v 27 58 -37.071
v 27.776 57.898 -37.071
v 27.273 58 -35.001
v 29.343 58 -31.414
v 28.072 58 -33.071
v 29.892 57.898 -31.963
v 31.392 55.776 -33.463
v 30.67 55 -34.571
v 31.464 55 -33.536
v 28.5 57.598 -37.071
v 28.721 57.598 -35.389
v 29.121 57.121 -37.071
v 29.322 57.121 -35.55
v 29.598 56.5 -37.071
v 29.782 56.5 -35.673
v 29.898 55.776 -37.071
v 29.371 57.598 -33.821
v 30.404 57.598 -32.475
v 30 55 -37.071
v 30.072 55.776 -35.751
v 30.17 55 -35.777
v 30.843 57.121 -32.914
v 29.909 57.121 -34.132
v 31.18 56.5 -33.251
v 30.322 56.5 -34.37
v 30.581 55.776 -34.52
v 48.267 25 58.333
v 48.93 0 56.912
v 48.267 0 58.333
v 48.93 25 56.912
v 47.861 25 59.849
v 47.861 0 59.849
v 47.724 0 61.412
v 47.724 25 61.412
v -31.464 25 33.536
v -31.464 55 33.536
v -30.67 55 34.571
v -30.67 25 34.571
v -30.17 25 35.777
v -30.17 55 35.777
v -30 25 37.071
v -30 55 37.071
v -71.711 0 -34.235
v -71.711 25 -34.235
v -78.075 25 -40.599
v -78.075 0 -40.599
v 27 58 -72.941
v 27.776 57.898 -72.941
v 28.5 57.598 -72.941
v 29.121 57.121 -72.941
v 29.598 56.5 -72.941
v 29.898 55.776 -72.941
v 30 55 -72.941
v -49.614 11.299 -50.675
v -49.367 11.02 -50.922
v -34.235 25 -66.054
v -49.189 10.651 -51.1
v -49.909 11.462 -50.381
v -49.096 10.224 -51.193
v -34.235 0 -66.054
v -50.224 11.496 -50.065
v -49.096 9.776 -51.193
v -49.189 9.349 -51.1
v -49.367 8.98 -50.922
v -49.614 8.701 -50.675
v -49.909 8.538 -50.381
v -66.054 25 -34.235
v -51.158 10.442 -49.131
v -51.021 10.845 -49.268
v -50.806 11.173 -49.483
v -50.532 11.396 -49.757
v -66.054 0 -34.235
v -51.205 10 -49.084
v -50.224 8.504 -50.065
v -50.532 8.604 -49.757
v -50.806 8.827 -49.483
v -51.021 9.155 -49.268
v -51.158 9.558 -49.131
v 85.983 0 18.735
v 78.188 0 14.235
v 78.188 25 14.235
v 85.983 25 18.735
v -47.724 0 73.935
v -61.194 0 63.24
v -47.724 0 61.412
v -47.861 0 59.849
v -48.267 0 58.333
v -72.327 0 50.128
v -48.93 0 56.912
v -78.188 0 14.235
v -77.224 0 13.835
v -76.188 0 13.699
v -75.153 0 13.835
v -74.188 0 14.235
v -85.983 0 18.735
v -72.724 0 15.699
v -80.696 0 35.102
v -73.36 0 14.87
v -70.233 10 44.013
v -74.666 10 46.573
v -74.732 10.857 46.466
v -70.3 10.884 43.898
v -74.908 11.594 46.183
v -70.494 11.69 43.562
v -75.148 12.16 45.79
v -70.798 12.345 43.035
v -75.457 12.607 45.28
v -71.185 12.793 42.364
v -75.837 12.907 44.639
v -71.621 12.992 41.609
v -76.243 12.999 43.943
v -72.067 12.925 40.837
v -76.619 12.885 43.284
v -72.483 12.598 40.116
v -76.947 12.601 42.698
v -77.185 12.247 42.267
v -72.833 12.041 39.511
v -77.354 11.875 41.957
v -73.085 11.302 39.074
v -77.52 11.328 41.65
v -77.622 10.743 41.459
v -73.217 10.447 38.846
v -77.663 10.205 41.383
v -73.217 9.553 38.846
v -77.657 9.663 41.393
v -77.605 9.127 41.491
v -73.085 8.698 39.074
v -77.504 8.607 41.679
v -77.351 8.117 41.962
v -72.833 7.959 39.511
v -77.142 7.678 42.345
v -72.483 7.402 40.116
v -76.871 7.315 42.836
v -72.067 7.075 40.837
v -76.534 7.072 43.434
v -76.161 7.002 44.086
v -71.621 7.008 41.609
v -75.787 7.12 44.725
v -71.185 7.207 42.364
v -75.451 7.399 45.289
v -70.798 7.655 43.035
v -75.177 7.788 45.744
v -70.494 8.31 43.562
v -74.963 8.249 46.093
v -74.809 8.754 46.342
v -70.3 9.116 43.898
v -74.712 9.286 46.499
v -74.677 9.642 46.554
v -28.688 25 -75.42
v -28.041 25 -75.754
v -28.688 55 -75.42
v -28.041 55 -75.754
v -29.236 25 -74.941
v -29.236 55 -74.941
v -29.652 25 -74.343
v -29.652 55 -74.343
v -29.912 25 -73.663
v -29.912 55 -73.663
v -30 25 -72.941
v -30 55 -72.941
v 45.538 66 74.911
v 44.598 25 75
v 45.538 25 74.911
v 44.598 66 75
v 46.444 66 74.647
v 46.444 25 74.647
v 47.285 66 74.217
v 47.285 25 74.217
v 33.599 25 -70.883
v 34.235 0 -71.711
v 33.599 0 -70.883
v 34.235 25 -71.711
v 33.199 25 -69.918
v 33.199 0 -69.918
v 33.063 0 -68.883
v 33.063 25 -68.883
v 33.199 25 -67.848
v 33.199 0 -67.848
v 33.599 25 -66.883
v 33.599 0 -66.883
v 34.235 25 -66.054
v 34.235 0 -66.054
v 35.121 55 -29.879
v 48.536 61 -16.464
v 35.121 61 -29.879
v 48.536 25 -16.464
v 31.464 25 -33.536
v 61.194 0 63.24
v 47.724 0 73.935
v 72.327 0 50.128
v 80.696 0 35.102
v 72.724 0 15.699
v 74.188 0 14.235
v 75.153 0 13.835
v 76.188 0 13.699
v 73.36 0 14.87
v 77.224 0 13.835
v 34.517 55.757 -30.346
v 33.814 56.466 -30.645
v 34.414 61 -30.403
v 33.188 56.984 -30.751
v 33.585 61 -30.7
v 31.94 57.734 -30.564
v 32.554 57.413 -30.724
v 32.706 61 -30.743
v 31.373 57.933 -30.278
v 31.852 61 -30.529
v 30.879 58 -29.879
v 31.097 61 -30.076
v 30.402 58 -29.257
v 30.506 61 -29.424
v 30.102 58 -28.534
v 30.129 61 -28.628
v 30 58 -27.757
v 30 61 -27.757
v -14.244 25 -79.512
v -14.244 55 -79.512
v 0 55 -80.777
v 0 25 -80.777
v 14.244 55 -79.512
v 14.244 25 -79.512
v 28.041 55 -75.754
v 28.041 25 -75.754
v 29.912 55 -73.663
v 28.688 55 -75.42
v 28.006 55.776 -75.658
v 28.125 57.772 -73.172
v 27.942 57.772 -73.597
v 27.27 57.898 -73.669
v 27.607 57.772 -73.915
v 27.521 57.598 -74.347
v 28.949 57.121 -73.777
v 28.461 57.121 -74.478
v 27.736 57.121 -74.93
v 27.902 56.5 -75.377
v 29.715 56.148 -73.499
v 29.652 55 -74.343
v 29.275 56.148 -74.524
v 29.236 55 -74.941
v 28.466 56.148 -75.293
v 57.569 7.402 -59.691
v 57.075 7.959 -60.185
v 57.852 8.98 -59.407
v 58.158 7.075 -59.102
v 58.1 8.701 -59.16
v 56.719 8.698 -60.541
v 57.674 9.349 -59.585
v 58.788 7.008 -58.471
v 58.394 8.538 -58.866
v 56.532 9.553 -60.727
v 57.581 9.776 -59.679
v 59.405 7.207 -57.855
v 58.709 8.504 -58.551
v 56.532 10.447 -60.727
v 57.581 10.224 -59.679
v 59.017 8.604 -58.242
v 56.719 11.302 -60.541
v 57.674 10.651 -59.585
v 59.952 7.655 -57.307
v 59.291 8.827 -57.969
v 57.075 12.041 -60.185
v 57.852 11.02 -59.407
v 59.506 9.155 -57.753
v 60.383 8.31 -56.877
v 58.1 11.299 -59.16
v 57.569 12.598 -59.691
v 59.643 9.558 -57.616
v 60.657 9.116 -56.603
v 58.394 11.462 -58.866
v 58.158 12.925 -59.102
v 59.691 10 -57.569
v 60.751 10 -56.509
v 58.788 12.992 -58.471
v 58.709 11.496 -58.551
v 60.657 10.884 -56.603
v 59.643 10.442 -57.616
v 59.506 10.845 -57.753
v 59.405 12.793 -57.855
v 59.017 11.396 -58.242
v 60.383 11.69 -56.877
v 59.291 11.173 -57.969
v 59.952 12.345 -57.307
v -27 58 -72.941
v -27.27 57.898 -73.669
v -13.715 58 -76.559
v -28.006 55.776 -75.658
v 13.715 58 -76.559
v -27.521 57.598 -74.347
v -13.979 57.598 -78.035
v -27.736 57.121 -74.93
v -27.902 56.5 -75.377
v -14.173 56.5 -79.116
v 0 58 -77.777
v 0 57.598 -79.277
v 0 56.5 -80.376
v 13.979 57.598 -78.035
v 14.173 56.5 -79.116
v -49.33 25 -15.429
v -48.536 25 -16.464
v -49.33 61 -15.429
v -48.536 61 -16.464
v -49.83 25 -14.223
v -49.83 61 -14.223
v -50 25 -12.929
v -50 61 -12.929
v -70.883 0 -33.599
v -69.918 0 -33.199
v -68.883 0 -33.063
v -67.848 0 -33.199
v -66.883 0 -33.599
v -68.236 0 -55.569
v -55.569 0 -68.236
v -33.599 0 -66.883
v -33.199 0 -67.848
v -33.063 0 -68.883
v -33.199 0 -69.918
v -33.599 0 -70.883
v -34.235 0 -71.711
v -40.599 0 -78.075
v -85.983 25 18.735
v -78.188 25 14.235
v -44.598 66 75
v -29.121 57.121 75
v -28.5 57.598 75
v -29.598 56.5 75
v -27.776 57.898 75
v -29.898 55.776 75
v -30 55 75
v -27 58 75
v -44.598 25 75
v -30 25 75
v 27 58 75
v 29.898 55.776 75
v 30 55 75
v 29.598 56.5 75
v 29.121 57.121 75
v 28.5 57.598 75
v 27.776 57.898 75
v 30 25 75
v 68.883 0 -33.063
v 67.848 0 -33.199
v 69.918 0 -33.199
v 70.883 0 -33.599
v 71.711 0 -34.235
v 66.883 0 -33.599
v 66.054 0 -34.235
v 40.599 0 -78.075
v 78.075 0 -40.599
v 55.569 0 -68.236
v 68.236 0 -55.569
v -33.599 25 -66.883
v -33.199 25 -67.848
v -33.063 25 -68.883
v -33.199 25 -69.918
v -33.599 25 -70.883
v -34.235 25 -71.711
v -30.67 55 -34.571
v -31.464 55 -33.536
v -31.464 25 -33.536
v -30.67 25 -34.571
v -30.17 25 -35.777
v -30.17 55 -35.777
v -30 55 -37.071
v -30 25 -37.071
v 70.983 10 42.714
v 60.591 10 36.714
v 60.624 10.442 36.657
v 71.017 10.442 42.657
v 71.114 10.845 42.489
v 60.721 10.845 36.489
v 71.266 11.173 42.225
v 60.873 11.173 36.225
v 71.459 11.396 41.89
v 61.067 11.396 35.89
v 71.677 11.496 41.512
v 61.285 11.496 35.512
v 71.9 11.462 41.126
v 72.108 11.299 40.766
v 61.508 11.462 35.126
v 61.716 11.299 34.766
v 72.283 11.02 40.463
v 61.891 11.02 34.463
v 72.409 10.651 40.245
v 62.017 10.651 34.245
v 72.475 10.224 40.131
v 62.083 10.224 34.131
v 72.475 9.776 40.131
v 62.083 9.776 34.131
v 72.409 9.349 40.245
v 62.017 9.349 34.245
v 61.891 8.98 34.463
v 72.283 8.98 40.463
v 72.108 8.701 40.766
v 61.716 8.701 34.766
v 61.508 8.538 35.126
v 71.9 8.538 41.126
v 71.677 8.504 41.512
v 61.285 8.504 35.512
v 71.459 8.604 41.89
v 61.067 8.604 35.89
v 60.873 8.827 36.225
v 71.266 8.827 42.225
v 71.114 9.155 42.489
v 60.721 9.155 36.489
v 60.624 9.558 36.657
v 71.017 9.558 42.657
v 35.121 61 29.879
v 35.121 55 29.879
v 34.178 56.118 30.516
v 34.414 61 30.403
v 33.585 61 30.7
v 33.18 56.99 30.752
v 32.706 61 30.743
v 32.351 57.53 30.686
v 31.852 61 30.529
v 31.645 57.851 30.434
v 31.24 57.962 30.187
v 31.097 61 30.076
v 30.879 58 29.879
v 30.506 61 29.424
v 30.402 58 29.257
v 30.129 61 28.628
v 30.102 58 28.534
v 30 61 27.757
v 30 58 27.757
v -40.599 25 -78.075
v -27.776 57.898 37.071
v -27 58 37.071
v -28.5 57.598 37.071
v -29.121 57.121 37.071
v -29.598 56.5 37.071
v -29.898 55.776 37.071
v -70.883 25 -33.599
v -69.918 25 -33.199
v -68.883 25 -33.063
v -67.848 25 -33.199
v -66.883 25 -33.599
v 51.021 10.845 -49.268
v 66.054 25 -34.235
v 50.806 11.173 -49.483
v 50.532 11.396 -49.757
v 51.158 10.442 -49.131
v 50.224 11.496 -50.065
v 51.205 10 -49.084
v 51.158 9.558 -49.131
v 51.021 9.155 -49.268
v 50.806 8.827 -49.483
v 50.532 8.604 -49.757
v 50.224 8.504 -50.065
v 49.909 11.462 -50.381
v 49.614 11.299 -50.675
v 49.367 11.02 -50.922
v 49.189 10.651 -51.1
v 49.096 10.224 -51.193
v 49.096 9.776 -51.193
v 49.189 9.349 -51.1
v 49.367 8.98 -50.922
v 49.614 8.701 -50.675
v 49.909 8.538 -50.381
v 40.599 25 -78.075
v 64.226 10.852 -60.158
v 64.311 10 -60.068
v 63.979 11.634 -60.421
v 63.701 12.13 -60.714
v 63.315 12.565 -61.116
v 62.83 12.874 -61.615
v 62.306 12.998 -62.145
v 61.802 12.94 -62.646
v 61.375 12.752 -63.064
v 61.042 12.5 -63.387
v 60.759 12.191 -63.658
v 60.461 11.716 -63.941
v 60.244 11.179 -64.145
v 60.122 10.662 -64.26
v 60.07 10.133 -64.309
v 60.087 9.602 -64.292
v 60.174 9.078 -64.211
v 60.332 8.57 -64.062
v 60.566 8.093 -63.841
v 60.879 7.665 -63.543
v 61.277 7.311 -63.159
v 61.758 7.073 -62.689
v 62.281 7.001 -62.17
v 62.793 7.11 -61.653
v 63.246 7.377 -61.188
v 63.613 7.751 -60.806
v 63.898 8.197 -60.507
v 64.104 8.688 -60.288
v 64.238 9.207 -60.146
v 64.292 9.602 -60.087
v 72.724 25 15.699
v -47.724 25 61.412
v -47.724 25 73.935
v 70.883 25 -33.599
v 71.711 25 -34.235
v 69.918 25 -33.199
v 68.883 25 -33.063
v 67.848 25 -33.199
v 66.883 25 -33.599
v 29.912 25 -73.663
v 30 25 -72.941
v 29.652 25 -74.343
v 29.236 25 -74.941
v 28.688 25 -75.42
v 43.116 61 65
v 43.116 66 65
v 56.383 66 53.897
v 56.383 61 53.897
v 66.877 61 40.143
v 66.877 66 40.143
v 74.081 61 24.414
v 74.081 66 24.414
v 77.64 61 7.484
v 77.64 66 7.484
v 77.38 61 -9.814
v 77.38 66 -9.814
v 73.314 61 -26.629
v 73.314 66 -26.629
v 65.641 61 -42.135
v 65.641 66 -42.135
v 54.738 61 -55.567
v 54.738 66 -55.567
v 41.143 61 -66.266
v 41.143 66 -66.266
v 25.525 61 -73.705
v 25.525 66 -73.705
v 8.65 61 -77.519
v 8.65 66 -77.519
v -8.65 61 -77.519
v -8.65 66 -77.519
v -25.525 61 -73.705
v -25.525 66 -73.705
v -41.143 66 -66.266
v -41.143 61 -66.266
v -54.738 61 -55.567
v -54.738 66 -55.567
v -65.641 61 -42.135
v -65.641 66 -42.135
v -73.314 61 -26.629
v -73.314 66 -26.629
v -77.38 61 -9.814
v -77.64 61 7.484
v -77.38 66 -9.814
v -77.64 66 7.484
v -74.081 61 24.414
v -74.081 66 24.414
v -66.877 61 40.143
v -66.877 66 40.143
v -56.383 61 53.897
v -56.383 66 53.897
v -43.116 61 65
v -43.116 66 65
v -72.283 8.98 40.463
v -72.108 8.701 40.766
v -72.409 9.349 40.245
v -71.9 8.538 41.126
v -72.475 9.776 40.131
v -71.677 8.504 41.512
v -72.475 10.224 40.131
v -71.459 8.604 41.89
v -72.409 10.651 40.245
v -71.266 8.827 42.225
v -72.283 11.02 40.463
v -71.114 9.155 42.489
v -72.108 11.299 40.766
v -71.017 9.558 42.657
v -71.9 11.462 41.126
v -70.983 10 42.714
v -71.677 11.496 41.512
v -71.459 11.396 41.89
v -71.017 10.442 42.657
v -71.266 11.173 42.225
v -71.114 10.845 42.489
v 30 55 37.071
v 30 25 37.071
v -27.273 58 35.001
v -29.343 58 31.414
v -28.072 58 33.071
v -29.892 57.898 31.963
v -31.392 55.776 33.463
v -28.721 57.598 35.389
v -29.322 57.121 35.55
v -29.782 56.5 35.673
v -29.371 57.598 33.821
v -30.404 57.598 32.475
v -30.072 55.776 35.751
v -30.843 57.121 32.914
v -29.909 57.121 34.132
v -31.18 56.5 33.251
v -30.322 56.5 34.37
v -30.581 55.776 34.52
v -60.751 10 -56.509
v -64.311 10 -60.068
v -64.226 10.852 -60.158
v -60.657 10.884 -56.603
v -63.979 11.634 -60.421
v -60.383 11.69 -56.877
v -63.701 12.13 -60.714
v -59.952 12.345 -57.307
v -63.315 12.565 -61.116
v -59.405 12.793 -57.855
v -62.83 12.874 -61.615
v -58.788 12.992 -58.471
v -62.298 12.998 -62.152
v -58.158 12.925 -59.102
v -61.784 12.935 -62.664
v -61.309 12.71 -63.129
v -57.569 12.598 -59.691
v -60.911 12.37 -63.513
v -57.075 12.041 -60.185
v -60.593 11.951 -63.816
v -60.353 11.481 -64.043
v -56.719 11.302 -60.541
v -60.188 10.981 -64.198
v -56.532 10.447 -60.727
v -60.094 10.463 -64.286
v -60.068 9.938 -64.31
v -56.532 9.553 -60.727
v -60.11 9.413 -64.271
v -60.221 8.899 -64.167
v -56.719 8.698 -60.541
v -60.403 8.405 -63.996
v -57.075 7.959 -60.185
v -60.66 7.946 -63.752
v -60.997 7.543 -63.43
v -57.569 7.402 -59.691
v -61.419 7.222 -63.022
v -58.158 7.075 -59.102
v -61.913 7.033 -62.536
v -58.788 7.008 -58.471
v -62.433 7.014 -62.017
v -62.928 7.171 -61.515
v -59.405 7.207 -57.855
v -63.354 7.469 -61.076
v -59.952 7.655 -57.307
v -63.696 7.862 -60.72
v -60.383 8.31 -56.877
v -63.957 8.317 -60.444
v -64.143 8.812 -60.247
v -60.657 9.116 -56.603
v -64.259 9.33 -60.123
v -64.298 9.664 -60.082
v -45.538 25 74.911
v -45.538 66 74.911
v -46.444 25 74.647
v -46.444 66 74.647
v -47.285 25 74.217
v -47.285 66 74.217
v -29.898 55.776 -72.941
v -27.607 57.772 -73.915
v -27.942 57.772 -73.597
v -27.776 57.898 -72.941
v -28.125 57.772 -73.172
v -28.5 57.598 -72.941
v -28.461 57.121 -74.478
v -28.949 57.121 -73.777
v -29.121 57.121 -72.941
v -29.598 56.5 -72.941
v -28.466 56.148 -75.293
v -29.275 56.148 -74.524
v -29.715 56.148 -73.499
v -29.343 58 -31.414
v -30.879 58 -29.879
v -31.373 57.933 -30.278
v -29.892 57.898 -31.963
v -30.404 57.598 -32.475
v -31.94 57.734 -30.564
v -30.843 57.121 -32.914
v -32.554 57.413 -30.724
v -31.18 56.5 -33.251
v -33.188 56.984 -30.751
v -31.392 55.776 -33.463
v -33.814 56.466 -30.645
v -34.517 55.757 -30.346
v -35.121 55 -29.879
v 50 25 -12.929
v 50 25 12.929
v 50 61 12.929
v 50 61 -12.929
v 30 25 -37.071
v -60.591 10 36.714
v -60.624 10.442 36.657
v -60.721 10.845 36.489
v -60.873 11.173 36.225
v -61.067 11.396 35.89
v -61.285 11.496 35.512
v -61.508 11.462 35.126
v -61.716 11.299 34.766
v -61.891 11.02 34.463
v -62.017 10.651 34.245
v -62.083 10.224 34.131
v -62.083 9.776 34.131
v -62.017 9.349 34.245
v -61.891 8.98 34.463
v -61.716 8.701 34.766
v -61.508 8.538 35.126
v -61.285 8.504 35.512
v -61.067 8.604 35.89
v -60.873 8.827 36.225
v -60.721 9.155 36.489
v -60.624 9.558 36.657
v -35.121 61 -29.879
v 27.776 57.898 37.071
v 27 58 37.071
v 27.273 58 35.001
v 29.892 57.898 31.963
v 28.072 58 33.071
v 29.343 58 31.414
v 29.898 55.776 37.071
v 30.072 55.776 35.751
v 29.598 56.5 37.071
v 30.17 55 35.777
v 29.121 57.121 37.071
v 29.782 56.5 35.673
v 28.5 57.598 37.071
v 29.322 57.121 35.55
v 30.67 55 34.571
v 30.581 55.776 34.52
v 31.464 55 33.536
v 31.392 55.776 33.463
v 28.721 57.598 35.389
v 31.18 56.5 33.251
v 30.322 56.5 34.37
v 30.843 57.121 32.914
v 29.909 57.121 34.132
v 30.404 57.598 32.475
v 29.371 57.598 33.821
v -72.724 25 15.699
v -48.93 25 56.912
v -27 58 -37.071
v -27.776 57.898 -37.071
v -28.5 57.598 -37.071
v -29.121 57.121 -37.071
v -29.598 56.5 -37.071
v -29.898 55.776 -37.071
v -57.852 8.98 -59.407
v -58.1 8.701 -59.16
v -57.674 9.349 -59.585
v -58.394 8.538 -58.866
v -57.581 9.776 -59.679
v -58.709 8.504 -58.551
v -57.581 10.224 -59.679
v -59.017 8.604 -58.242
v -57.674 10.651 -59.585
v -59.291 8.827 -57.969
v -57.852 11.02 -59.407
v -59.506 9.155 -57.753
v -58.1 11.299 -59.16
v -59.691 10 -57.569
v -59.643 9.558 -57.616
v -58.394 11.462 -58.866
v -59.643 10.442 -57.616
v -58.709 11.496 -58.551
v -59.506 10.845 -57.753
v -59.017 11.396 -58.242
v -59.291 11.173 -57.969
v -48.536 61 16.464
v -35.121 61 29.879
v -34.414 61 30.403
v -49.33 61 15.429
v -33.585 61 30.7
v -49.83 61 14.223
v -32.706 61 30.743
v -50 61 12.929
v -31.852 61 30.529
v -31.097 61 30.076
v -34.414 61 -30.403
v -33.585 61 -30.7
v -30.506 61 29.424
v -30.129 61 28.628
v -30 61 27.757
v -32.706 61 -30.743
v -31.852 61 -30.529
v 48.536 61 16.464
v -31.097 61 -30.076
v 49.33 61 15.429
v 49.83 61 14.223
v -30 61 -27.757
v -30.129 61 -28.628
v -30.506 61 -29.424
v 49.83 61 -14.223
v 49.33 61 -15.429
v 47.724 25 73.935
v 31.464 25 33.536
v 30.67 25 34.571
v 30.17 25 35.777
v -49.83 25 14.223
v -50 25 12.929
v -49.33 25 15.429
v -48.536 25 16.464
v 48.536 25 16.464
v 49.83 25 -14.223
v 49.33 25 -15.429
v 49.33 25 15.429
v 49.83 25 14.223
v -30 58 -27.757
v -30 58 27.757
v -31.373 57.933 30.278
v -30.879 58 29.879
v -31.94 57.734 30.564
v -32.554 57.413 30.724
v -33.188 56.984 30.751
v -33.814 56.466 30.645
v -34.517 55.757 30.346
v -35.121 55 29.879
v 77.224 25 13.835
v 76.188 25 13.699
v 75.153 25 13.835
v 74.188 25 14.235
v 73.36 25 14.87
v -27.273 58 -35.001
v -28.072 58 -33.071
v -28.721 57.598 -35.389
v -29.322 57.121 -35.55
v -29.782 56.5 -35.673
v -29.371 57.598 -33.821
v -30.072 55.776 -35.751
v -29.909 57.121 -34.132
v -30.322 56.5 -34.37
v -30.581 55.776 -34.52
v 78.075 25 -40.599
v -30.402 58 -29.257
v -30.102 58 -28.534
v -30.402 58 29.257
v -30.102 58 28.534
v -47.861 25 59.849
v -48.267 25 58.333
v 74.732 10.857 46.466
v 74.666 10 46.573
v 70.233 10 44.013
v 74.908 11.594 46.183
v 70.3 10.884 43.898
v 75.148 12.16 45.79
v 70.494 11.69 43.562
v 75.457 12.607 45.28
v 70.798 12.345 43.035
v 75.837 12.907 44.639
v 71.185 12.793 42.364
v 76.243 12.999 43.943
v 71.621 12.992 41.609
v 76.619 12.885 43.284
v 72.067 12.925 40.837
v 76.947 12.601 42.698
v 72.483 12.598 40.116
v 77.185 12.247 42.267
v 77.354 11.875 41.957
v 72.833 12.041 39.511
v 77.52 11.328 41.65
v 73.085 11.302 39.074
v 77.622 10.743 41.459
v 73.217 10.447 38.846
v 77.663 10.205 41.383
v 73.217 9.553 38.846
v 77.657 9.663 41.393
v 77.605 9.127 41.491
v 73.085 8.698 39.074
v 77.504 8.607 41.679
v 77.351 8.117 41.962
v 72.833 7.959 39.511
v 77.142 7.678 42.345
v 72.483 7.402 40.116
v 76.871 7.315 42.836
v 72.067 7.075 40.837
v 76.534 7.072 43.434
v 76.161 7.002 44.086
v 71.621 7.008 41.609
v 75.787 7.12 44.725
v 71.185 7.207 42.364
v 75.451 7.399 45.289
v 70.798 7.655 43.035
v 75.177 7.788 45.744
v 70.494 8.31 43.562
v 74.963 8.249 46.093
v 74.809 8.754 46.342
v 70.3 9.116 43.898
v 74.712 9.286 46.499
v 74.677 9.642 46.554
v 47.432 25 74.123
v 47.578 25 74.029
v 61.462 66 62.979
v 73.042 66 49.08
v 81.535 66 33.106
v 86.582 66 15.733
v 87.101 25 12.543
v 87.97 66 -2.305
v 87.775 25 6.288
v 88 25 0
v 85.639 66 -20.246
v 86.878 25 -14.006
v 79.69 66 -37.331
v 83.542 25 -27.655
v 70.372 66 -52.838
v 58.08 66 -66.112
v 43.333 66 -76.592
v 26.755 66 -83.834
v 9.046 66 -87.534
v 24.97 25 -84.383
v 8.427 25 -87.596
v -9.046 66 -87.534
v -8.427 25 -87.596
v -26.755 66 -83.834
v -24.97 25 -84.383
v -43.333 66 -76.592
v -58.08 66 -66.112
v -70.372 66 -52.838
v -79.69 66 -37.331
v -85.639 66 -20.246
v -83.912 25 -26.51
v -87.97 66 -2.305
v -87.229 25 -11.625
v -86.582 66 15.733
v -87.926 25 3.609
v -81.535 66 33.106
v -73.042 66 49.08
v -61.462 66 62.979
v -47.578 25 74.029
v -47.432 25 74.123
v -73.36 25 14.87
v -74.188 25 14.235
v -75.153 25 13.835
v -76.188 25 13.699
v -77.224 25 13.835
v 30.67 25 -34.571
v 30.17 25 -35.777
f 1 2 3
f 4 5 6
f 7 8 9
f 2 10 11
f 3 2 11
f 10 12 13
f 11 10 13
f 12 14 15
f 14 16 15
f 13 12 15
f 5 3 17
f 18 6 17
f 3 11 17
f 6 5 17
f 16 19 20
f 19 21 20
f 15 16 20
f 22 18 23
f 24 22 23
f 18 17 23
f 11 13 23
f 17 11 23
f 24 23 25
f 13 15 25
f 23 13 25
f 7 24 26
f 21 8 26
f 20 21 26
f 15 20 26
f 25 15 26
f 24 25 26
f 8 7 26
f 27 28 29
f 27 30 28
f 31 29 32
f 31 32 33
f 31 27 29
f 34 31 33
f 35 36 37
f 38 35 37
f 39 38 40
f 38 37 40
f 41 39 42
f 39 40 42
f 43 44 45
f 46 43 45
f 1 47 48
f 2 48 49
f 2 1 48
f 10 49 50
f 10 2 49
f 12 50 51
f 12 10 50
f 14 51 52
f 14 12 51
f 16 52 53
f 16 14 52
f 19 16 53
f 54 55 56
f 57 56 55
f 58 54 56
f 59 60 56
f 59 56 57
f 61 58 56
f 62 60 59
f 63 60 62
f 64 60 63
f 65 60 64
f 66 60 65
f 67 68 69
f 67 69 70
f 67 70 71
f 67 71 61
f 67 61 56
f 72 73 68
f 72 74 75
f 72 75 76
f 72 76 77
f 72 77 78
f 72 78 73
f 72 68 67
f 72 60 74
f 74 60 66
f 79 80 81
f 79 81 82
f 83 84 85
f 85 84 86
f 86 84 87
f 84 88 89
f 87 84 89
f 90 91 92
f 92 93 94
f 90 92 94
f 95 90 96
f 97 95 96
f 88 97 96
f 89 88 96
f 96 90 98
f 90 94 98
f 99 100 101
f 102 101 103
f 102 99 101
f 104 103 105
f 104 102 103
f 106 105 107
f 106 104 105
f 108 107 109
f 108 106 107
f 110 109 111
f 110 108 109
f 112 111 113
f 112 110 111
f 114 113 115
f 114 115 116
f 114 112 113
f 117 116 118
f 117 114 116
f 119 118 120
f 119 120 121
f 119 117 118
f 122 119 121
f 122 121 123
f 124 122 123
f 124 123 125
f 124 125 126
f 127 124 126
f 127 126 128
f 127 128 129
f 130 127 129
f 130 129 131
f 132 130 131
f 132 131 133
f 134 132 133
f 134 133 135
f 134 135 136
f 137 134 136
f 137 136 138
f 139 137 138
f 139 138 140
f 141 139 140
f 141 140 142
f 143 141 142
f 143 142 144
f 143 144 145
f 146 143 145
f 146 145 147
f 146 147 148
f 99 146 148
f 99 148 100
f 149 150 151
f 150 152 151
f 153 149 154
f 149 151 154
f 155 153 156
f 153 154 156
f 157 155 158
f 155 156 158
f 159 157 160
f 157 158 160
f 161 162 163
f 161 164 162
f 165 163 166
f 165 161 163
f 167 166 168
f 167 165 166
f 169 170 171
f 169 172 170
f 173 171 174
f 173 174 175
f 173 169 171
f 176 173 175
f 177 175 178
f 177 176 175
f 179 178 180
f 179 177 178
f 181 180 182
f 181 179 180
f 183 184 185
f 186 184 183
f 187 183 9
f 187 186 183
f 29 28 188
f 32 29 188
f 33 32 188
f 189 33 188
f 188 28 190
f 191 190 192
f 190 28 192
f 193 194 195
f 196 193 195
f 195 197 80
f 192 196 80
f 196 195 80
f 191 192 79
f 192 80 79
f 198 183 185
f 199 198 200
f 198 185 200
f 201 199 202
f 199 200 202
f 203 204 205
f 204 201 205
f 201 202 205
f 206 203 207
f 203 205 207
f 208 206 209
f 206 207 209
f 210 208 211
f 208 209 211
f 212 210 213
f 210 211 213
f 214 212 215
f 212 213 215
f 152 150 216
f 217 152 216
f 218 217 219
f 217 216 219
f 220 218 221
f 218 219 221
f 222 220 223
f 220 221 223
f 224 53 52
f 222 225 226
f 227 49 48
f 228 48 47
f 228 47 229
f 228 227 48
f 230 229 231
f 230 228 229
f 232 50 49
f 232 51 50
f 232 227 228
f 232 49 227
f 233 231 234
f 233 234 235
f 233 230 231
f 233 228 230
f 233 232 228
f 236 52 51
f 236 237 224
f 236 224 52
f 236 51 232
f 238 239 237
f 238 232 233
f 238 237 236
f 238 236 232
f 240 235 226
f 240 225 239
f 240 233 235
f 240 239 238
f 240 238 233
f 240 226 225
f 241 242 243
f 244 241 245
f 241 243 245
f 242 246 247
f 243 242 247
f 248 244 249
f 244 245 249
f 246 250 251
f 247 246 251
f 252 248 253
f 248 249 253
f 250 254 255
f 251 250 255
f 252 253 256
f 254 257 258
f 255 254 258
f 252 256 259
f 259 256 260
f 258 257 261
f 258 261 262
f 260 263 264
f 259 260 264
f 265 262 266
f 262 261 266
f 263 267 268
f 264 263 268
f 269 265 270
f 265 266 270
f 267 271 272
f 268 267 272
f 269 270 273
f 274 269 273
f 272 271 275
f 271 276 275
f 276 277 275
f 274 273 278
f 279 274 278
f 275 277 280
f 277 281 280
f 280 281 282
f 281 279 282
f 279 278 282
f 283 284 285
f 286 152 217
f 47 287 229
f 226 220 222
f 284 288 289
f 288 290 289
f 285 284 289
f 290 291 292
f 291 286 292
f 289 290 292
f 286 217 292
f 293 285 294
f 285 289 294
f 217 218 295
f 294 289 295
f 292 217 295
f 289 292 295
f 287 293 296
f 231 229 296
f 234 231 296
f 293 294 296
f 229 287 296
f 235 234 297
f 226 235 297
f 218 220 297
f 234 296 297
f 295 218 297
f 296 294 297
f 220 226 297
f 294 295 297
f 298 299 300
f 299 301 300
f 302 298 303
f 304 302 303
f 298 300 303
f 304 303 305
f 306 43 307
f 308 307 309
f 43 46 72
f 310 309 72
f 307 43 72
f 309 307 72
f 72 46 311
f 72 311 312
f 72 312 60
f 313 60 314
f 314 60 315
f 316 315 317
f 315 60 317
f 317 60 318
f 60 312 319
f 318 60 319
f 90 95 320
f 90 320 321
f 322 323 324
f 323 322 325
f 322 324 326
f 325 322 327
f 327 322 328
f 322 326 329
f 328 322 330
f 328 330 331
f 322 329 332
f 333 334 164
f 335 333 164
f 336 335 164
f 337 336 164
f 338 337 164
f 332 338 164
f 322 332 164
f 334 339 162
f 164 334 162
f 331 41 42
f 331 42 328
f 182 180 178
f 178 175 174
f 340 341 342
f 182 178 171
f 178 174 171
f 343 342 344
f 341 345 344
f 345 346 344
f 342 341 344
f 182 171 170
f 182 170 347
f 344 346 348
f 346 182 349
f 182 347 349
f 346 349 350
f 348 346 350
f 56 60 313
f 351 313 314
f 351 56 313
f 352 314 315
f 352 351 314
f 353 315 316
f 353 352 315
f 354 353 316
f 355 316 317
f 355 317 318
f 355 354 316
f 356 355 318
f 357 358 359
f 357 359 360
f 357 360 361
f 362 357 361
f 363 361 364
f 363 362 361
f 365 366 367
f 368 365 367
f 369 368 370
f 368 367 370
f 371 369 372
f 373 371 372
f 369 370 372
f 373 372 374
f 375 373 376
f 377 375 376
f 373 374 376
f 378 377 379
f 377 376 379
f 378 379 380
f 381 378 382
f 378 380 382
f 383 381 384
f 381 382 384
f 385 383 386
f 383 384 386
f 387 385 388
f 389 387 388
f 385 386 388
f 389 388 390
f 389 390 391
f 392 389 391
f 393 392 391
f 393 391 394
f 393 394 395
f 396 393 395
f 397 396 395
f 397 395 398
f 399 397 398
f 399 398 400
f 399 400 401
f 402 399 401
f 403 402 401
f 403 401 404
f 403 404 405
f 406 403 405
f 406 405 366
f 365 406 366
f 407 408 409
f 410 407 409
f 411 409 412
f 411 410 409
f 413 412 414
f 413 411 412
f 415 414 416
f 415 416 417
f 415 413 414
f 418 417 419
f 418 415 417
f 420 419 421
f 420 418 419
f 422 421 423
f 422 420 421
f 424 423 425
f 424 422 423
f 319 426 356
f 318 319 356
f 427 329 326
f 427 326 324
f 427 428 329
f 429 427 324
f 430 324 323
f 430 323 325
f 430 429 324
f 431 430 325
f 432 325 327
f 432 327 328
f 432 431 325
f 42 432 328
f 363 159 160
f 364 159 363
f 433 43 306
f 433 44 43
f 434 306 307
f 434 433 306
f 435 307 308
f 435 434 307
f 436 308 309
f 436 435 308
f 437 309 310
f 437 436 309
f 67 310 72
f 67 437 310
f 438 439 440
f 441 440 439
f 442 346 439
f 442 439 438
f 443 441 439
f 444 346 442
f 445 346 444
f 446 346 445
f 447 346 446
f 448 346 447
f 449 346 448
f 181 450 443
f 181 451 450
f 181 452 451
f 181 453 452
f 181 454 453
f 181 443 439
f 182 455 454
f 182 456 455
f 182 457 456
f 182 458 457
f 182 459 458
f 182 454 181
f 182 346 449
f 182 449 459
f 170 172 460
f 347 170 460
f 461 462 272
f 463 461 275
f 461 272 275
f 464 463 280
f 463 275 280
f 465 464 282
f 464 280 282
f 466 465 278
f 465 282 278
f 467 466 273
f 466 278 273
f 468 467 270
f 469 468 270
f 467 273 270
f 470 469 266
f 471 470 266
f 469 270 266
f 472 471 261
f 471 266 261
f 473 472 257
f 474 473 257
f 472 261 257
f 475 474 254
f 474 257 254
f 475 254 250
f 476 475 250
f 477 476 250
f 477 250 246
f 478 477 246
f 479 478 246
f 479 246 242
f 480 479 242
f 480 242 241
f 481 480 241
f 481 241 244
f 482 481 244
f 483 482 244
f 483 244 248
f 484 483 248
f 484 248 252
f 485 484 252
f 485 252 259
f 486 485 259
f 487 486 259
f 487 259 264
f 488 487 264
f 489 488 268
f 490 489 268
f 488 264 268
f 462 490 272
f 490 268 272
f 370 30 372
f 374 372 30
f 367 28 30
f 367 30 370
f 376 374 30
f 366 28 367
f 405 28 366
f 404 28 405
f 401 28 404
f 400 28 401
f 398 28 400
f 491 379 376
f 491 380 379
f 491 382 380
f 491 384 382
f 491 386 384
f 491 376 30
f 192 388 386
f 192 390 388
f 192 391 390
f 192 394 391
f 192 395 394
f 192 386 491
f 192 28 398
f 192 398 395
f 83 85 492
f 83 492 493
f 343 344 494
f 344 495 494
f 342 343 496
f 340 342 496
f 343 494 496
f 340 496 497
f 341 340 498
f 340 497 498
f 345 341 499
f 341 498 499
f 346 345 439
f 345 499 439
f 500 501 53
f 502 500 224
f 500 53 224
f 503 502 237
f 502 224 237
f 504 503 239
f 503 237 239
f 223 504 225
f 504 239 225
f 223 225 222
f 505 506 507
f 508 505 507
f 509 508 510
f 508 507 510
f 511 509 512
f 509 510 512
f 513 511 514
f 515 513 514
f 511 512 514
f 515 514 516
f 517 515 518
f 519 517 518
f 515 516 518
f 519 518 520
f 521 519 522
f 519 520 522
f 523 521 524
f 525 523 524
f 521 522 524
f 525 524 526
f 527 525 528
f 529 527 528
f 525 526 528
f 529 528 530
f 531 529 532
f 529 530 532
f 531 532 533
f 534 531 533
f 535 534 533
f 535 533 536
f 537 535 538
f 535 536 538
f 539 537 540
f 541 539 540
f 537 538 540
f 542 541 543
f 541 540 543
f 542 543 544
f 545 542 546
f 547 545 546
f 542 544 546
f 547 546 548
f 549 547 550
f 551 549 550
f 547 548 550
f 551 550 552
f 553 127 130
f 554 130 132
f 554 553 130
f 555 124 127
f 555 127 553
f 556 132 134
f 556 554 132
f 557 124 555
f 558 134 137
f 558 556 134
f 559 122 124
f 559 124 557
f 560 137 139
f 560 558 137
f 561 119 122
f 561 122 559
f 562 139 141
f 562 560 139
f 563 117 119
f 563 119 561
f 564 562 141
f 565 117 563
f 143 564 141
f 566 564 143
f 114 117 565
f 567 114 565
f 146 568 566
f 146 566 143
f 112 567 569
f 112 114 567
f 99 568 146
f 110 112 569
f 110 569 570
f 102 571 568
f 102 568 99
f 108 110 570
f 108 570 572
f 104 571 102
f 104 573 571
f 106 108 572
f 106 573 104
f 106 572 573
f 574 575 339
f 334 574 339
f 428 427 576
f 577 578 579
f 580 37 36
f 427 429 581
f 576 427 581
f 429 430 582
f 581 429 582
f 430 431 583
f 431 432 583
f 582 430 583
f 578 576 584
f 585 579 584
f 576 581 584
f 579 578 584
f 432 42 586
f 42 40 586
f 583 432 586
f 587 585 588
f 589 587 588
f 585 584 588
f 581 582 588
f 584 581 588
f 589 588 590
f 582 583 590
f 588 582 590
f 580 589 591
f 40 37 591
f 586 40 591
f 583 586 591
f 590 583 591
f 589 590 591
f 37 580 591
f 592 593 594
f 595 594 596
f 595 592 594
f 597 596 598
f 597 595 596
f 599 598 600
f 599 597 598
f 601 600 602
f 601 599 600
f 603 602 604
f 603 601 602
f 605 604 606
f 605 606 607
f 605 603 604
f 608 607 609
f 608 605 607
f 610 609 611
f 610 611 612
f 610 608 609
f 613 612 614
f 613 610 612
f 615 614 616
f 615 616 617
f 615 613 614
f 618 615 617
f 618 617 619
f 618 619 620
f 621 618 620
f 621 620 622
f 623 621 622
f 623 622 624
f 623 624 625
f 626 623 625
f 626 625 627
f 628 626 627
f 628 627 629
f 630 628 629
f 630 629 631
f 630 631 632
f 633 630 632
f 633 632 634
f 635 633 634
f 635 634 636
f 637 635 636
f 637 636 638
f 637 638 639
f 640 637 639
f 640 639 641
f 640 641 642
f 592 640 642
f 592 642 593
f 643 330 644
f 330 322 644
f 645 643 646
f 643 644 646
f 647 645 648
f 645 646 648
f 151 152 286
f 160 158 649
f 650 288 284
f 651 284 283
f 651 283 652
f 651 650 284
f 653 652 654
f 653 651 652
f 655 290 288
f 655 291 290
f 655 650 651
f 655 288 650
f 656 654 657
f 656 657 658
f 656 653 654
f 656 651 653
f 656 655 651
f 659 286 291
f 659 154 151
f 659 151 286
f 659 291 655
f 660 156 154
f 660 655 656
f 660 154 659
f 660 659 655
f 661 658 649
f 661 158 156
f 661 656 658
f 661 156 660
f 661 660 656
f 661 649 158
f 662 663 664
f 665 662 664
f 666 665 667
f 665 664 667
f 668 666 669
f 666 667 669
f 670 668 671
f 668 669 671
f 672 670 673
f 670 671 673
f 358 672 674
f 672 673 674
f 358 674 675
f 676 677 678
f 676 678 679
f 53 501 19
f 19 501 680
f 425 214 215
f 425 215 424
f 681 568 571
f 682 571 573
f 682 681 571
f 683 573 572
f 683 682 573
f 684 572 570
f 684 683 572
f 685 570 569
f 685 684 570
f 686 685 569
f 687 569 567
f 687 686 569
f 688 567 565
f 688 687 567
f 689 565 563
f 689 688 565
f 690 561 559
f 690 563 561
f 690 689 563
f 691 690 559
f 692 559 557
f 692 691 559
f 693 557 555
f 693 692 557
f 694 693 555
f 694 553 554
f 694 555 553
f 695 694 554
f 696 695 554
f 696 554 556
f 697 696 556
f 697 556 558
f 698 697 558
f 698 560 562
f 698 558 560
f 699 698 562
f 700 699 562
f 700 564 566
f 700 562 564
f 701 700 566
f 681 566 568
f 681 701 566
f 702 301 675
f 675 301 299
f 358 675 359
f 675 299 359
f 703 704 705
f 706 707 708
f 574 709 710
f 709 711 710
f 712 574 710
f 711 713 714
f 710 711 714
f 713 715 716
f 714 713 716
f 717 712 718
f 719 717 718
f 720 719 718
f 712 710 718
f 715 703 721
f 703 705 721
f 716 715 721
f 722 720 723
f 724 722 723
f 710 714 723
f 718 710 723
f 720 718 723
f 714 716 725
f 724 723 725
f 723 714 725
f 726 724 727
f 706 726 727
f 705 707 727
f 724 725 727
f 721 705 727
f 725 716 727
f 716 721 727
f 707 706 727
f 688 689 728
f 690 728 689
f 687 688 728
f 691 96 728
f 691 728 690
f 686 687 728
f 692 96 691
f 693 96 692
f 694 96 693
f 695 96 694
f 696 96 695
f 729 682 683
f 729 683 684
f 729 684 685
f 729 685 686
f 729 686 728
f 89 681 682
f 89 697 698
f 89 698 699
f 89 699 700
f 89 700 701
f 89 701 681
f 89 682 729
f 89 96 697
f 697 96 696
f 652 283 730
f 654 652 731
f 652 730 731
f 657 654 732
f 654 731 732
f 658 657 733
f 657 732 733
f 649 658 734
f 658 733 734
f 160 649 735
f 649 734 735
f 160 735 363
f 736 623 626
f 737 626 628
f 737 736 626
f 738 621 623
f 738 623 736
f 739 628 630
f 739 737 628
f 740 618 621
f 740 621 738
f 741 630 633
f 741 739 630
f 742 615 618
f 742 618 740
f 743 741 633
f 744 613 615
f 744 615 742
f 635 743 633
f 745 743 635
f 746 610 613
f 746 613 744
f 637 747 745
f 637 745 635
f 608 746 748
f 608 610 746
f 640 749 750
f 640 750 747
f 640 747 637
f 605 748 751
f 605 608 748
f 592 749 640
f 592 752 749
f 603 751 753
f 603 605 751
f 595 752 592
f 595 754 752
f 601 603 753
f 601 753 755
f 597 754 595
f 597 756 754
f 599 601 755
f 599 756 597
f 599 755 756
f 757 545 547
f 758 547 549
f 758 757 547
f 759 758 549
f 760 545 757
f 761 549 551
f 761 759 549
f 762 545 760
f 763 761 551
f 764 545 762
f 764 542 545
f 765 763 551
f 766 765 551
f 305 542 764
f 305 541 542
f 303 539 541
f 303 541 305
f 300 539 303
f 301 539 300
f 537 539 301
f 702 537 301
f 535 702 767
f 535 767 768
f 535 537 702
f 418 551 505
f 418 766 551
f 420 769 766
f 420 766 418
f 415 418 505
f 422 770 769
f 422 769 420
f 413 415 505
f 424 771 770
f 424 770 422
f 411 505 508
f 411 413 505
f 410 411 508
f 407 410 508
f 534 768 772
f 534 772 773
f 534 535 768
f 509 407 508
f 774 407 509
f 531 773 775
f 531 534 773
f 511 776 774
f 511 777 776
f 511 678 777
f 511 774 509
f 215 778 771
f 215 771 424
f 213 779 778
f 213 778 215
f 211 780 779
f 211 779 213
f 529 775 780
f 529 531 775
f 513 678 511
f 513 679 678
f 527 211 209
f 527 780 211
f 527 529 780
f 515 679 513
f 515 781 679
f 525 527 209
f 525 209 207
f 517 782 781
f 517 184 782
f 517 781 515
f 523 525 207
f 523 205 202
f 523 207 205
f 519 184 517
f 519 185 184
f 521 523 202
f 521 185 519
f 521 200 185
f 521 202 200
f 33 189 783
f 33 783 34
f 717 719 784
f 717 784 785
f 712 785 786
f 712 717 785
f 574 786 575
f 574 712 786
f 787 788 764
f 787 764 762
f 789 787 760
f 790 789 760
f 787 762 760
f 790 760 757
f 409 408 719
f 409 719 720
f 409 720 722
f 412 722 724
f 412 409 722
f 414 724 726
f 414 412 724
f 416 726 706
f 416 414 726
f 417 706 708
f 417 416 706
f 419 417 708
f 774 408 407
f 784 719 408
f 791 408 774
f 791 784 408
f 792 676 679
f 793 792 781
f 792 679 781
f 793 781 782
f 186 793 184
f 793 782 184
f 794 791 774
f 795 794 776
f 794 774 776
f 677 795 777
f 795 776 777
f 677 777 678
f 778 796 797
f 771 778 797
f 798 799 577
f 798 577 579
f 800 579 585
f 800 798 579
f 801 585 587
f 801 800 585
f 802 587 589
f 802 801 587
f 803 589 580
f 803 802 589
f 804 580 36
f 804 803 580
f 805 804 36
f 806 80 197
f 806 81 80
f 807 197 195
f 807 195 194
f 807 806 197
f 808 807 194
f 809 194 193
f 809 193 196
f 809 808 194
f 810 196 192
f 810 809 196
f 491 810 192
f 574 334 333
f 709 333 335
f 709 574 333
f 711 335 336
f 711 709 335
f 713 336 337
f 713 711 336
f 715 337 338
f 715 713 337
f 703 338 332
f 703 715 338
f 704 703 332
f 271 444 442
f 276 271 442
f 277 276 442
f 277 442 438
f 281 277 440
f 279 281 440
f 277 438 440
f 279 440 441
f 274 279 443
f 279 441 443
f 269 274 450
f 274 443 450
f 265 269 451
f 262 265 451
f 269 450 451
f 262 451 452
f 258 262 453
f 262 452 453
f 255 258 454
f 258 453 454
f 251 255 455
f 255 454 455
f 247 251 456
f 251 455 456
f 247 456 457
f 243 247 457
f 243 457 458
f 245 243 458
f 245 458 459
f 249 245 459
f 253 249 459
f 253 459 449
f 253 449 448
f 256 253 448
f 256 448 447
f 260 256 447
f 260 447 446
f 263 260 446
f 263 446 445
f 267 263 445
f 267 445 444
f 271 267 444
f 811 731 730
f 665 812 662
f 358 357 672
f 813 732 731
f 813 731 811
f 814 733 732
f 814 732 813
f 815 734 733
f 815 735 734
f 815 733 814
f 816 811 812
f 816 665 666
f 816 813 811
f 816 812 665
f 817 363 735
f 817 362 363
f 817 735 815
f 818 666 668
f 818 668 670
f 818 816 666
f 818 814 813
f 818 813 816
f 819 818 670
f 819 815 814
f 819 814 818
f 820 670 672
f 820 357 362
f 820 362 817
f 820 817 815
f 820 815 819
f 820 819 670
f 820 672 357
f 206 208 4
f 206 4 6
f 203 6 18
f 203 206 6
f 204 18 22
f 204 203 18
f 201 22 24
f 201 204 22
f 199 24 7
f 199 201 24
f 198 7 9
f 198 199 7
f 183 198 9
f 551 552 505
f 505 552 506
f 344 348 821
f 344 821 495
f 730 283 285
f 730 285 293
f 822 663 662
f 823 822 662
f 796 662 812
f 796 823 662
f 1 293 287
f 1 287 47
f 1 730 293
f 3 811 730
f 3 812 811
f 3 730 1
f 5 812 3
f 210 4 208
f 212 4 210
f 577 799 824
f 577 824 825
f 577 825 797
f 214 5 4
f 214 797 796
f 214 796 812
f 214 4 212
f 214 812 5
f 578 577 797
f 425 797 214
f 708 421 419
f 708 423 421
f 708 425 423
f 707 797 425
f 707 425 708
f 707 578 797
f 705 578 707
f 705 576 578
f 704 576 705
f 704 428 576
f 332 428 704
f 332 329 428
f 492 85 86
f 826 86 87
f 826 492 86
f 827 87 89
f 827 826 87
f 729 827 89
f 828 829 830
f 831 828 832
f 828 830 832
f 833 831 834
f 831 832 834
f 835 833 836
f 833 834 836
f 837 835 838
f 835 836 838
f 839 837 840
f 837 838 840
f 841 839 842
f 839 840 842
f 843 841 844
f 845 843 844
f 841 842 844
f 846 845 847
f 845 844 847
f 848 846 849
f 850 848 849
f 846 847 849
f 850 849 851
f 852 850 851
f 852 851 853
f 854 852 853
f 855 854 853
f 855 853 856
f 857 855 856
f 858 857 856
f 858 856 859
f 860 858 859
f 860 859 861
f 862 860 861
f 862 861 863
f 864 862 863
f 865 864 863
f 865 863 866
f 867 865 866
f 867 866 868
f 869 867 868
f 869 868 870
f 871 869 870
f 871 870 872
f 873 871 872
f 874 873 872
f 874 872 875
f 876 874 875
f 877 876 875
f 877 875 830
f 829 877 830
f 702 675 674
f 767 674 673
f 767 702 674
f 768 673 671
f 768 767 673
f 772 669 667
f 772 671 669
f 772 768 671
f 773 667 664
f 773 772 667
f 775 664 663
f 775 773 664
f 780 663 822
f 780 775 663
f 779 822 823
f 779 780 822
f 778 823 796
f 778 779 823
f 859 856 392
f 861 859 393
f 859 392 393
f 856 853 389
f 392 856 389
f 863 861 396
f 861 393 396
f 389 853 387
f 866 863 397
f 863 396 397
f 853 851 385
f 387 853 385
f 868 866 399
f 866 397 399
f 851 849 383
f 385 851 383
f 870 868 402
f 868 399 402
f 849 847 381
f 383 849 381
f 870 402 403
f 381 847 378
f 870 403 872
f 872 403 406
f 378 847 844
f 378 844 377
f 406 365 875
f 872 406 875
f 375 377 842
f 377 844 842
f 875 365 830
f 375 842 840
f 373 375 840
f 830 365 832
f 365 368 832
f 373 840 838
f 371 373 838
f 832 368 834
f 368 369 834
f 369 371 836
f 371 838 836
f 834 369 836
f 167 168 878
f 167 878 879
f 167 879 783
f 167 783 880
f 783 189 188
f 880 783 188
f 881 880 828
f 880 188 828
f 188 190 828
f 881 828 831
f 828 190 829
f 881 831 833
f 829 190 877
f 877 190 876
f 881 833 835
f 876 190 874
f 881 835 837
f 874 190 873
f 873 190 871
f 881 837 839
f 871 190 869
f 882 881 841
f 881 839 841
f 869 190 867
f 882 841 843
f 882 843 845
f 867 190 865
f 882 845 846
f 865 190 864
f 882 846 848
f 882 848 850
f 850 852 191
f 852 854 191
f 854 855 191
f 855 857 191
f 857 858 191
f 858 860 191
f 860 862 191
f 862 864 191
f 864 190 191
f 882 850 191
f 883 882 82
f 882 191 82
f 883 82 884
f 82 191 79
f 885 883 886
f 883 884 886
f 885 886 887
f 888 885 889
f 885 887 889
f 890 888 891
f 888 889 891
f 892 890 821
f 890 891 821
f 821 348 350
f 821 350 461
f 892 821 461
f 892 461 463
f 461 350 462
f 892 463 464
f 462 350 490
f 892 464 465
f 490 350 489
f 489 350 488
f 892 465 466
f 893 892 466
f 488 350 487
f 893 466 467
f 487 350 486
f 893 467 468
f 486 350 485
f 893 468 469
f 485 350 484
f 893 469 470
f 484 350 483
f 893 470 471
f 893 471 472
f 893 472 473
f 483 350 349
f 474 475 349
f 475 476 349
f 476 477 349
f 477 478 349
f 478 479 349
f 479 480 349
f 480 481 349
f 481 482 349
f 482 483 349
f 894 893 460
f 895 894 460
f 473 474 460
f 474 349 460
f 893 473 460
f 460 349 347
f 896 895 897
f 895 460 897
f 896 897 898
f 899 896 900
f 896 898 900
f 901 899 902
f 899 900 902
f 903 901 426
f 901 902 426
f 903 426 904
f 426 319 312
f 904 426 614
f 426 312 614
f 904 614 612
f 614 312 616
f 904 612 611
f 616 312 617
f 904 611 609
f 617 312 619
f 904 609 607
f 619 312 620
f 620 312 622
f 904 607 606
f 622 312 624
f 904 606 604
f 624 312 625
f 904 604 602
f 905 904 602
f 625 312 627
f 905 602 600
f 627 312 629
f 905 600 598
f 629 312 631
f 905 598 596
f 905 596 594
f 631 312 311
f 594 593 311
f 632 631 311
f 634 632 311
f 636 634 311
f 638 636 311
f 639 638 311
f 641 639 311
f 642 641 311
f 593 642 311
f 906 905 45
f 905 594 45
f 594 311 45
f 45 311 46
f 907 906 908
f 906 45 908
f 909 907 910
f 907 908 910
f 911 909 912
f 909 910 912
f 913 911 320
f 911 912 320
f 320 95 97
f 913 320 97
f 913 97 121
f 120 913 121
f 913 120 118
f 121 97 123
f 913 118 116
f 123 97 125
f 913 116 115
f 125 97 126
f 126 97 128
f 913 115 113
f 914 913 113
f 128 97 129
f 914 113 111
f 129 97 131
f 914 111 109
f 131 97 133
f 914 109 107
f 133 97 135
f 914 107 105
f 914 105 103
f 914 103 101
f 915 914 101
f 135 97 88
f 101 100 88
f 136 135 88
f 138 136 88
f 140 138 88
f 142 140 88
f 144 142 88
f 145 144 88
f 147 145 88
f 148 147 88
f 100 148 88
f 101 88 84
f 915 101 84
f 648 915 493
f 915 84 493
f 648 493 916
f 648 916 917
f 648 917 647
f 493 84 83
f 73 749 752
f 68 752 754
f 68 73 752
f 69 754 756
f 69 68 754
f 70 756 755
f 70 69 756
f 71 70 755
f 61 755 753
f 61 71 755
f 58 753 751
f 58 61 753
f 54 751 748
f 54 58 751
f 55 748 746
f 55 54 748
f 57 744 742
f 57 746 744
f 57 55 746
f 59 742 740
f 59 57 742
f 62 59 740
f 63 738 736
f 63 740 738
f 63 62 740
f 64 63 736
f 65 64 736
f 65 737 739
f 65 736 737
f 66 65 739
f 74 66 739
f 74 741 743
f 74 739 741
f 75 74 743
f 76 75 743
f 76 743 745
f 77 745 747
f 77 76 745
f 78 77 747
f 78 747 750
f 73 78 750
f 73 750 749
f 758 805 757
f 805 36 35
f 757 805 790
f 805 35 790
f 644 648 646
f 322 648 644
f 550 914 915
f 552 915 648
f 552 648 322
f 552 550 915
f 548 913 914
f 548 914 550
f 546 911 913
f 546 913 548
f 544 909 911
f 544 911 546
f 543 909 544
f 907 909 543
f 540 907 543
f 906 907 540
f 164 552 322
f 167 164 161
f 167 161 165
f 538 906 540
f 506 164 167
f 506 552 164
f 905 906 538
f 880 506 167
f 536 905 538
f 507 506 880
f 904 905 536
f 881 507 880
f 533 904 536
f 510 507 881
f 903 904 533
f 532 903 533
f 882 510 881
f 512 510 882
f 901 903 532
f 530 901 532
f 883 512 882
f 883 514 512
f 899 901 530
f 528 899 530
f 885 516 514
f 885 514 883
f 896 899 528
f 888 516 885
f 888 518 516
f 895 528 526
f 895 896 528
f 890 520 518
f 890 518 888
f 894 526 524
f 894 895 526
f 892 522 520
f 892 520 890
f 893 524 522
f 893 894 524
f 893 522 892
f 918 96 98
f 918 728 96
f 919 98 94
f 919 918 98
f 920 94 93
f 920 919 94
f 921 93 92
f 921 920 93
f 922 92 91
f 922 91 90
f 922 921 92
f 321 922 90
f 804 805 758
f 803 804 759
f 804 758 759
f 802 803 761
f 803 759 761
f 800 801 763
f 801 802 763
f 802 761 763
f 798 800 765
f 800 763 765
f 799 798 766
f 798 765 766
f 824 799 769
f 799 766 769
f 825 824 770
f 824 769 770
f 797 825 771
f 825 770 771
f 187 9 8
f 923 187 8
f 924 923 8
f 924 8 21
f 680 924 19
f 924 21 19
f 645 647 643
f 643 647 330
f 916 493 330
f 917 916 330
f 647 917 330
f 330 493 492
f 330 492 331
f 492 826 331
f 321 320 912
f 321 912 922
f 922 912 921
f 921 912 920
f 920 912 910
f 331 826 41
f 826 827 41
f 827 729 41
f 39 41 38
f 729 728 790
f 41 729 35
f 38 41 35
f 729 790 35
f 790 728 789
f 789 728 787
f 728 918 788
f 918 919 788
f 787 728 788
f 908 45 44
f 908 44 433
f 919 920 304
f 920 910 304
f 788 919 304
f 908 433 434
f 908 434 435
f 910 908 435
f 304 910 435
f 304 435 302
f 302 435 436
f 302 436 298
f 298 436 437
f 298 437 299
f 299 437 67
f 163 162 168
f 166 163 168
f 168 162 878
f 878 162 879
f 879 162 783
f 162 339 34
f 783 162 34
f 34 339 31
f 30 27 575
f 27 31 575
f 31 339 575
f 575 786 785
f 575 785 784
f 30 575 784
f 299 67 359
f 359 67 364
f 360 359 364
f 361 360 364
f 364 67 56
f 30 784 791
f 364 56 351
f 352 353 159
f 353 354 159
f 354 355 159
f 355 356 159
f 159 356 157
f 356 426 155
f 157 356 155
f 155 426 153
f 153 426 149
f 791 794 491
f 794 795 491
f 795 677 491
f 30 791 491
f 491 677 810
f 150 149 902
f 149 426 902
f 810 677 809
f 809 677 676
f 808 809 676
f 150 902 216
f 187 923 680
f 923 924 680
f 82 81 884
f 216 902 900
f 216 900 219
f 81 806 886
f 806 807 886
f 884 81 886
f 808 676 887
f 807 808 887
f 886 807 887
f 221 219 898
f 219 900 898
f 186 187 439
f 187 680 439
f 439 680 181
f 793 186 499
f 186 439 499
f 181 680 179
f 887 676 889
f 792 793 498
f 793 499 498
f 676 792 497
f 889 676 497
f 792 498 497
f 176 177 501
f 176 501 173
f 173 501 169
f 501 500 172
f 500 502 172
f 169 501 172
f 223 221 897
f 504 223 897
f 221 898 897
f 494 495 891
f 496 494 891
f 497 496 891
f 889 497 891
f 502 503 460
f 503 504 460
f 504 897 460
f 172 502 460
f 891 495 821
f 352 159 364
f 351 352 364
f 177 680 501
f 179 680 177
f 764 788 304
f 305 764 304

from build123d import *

# Parameters (mm, degrees)
BOSS_EXTRUDE1_DEPTH     = 66
CUT_EXTRUDE3_DEPTH      = 25
CUT_EXTRUDE3_DEPTH_BACK = 10
FILLET1_R               = 4
FILLET3_R               = 9
SKETCH4_W               = 60
SKETCH4_H               = 150
CUT_EXTRUDE4_DEPTH      = 33
CUT_EXTRUDE5_DEPTH      = 5
CUT_EXTRUDE6_DEPTH      = 132.030530793
FILLET5_R               = 3
FILLET6_R               = 5
FILLET7_R               = 3
SKETCH7_R               = 1.5
CUT_EXTRUDE7_DEPTH      = 198.739948877
SKETCH11_R              = 3
CUT_EXTRUDE10_DEPTH     = 210.0771447
SKETCH8_R               = 1.5
CUT_EXTRUDE8_DEPTH      = 205.670582053
SKETCH10_R              = 3
CUT_EXTRUDE9_DEPTH      = 216.914390172
FILLET10_R              = 5


with BuildPart() as part:
    # Sketch3 → Boss-Extrude1 (new body)
    with BuildSketch(Plane(origin=(0, 0, 0), x_dir=(1, 0, 0), z_dir=(0, 1, 0))):
        with BuildLine():
            Line((-46.032597146, -75), (46.032597146, -75))
            ThreePointArc((46.032597146, -75), (0, 88), (-46.032597146, -75))
        make_face()
    extrude(amount=BOSS_EXTRUDE1_DEPTH)

    # Sketch2 → Cut-Extrude3 (cut, two sides: drawn at the far end of the back side and taken through both)
    with BuildSketch(Plane(origin=(0, 0, 0), x_dir=(1, 0, 0), z_dir=(0, 1, 0)).offset(-CUT_EXTRUDE3_DEPTH_BACK)):
        with BuildLine():
            Line((68.882903046, 31.406243643), (31.406243643, 68.882903046))
            Line((31.406243643, 68.882903046), (40.598631798, 78.075291201))
            ThreePointArc((40.598631798, 78.075291201), (0, 88), (-40.598631798, 78.075291201))
            Line((-40.598631798, 78.075291201), (-31.406243643, 68.882903046))
            Line((-31.406243643, 68.882903046), (-68.882903046, 31.406243643))
            Line((-68.882903046, 31.406243643), (-78.075291201, 40.598631798))
            ThreePointArc((-78.075291201, 40.598631798), (-87.22877857, 11.624981252), (-85.982636075, -18.734628196))
            Line((-85.982636075, -18.734628196), (-74.724305826, -12.234628196))
            Line((-74.724305826, -12.234628196), (-47.724305826, -59))
            Line((-47.724305826, -59), (-47.724305826, -73.935043338))
            ThreePointArc((-47.724305826, -73.935043338), (-46.881475519, -74.472325418), (-46.032597146, -75))
            ThreePointArc((-46.032597146, -75), (0, -88), (46.032597146, -75))
            ThreePointArc((46.032597146, -75), (46.881475519, -74.472325418), (47.724305826, -73.935043338))
            Line((47.724305826, -73.935043338), (47.724305826, -59))
            Line((47.724305826, -59), (74.724305826, -12.234628196))
            Line((74.724305826, -12.234628196), (85.982636075, -18.734628196))
            ThreePointArc((85.982636075, -18.734628196), (87.49420545, -9.421465529), (88, 0))
            ThreePointArc((88, 0), (85.482821741, 20.897061687), (78.075291201, 40.598631798))
            Line((78.075291201, 40.598631798), (68.882903046, 31.406243643))
        make_face()
    extrude(amount=CUT_EXTRUDE3_DEPTH + CUT_EXTRUDE3_DEPTH_BACK, mode=Mode.SUBTRACT)

    # Fillet1
    fillet1_edges = [part.edges().sort_by_distance(p)[0] for p in [
        (74.724305826, 12.5, 12.234628196),
        (68.882903046, 12.5, -31.406243643),
        (31.406243643, 12.5, -68.882903046),
        (-31.406243643, 12.5, -68.882903046),
        (-68.882903046, 12.5, -31.406243643),
        (-74.724305826, 12.5, 12.234628196),
    ]]
    fillet(fillet1_edges, radius=FILLET1_R)

    # Fillet3
    fillet3_edges = [part.edges().sort_by_distance(p)[0] for p in [
        (47.724305826, 12.5, 59),
        (-47.724305826, 12.5, 59),
    ]]
    fillet(fillet3_edges, radius=FILLET3_R)

    # Sketch4 → Cut-Extrude4 (cut)
    with BuildSketch(Plane.XZ.offset(-25)):
        Rectangle(SKETCH4_W, SKETCH4_H)
        with BuildLine():
            Line((30, -75), (-30, -75))
            ThreePointArc((-30, -75), (0, -80.777472107), (30, -75))
        make_face()
    extrude(amount=-CUT_EXTRUDE4_DEPTH, mode=Mode.SUBTRACT)

    # Sketch5 → Cut-Extrude5 (cut)
    with BuildSketch(Plane(origin=(0, 66, 0), x_dir=(1, 0, 0), z_dir=(0, 1, 0))):
        with BuildLine():
            Line((-43.116122275, -65), (43.116122275, -65))
            ThreePointArc((43.116122275, -65), (0, 78), (-43.116122275, -65))
        make_face()
    extrude(amount=-CUT_EXTRUDE5_DEPTH, mode=Mode.SUBTRACT)

    # Sketch6 → Cut-Extrude6 (cut, through all)
    with BuildSketch(Plane.XZ.offset(-25)):
        Polygon((30, 35), (50, 15), (50, -15), (30, -35), align=None)
        Polygon((-50, -15), (-30, -35), (-30, 35), (-50, 15), align=None)
    extrude(amount=-CUT_EXTRUDE6_DEPTH, mode=Mode.SUBTRACT)

    # Fillet5
    fillet5_edges = [part.edges().sort_by_distance(p)[0] for p in [
        (30, 59.5, -35),
        (30, 59.5, 35),
        (-30, 59.5, 35),
        (-30, 59.5, -35),
    ]]
    fillet(fillet5_edges, radius=FILLET5_R)

    # Fillet6
    fillet6_edges = [part.edges().sort_by_distance(p)[0] for p in [
        (30, 41.5, -35),
        (30, 41.5, 35),
        (50, 43, 15),
        (50, 43, -15),
        (-30, 41.5, 35),
        (-50, 43, -15),
        (-50, 43, 15),
        (-30, 41.5, -35),
    ]]
    fillet(fillet6_edges, radius=FILLET6_R)

    # Fillet7
    fillet7_edges = [part.edges().sort_by_distance(p)[0] for p in [
        (-30, 41.5, -75),
        (30, 58, -56.035533906),
        (0, 58, -80.777472107),
        (30, 41.5, -75),
        (-30, 58, -56.035533906),
        (-33.292893219, 58, 31.707106781),
        (33.292893219, 58, -31.707106781),
        (33.292893219, 58, 31.707106781),
        (30, 58, 56.035533906),
        (-30, 58, 56.035533906),
        (-33.292893219, 58, -31.707106781),
        (30.380602337, 58, -35.15765065),
        (30.380602337, 58, 35.15765065),
        (-30.380602337, 58, 35.15765065),
        (-30.380602337, 58, -35.15765065),
    ]]
    fillet(fillet7_edges, radius=FILLET7_R)

    # Sketch7 → Cut-Extrude7 (cut, through all)
    with BuildSketch(Plane(origin=(50.144573344, 0, -50.144573344), x_dir=(0.7071067811865472, 0, 0.7071067811865478), z_dir=(-0.7071067811865478, 0, 0.7071067811865472))):
        with Locations((0, 10)):
            Circle(SKETCH7_R)
    cut_extrude7 = extrude(amount=-CUT_EXTRUDE7_DEPTH, mode=Mode.SUBTRACT)

    # Sketch11 → Cut-Extrude10 (cut, through all)
    with BuildSketch(Plane(origin=(58.629854718, 0, -58.629854718), x_dir=(0.7071067811865472, 0, 0.7071067811865478), z_dir=(-0.7071067811865478, 0, 0.7071067811865472))):
        with Locations((0, 10)):
            Circle(SKETCH11_R)
    cut_extrude10 = extrude(amount=-CUT_EXTRUDE10_DEPTH, mode=Mode.SUBTRACT)

    # Sketch8 → Cut-Extrude8 (cut, through all)
    with BuildSketch(Plane(origin=(61.340978781, 0, 35.415230611), x_dir=(-0.5000000000000003, 0, 0.8660254037844386), z_dir=(-0.8660254037844385, 0, -0.5000000000000002))):
        with Locations((0, 10)):
            Circle(SKETCH8_R)
    cut_extrude8 = extrude(amount=-CUT_EXTRUDE8_DEPTH, mode=Mode.SUBTRACT)

    # Sketch10 → Cut-Extrude9 (cut, through all)
    with BuildSketch(Plane(origin=(71.733283626, 0, 41.415230611), x_dir=(-0.5000000000000003, 0, 0.8660254037844386), z_dir=(-0.8660254037844385, 0, -0.5000000000000002))):
        with Locations((0, 10)):
            Circle(SKETCH10_R)
    cut_extrude9 = extrude(amount=-CUT_EXTRUDE9_DEPTH, mode=Mode.SUBTRACT)

    # Mirror1: Cut-Extrude7, Cut-Extrude10, Cut-Extrude8, Cut-Extrude9 across plane
    add(cut_extrude7.mirror(Plane(origin=(0, 0, 0), x_dir=(0, 0, 1), z_dir=(1, 0, 0))), mode=Mode.SUBTRACT)
    add(cut_extrude10.mirror(Plane(origin=(0, 0, 0), x_dir=(0, 0, 1), z_dir=(1, 0, 0))), mode=Mode.SUBTRACT)
    add(cut_extrude8.mirror(Plane(origin=(0, 0, 0), x_dir=(0, 0, 1), z_dir=(1, 0, 0))), mode=Mode.SUBTRACT)
    add(cut_extrude9.mirror(Plane(origin=(0, 0, 0), x_dir=(0, 0, 1), z_dir=(1, 0, 0))), mode=Mode.SUBTRACT)

    # Fillet10
    fillet10_edges = [part.edges().sort_by_distance(p)[0] for p in [
        (46.032597146, 45.5, 75),
        (-46.032597146, 45.5, 75),
    ]]
    fillet(fillet10_edges, radius=FILLET10_R)


solid = part.part
